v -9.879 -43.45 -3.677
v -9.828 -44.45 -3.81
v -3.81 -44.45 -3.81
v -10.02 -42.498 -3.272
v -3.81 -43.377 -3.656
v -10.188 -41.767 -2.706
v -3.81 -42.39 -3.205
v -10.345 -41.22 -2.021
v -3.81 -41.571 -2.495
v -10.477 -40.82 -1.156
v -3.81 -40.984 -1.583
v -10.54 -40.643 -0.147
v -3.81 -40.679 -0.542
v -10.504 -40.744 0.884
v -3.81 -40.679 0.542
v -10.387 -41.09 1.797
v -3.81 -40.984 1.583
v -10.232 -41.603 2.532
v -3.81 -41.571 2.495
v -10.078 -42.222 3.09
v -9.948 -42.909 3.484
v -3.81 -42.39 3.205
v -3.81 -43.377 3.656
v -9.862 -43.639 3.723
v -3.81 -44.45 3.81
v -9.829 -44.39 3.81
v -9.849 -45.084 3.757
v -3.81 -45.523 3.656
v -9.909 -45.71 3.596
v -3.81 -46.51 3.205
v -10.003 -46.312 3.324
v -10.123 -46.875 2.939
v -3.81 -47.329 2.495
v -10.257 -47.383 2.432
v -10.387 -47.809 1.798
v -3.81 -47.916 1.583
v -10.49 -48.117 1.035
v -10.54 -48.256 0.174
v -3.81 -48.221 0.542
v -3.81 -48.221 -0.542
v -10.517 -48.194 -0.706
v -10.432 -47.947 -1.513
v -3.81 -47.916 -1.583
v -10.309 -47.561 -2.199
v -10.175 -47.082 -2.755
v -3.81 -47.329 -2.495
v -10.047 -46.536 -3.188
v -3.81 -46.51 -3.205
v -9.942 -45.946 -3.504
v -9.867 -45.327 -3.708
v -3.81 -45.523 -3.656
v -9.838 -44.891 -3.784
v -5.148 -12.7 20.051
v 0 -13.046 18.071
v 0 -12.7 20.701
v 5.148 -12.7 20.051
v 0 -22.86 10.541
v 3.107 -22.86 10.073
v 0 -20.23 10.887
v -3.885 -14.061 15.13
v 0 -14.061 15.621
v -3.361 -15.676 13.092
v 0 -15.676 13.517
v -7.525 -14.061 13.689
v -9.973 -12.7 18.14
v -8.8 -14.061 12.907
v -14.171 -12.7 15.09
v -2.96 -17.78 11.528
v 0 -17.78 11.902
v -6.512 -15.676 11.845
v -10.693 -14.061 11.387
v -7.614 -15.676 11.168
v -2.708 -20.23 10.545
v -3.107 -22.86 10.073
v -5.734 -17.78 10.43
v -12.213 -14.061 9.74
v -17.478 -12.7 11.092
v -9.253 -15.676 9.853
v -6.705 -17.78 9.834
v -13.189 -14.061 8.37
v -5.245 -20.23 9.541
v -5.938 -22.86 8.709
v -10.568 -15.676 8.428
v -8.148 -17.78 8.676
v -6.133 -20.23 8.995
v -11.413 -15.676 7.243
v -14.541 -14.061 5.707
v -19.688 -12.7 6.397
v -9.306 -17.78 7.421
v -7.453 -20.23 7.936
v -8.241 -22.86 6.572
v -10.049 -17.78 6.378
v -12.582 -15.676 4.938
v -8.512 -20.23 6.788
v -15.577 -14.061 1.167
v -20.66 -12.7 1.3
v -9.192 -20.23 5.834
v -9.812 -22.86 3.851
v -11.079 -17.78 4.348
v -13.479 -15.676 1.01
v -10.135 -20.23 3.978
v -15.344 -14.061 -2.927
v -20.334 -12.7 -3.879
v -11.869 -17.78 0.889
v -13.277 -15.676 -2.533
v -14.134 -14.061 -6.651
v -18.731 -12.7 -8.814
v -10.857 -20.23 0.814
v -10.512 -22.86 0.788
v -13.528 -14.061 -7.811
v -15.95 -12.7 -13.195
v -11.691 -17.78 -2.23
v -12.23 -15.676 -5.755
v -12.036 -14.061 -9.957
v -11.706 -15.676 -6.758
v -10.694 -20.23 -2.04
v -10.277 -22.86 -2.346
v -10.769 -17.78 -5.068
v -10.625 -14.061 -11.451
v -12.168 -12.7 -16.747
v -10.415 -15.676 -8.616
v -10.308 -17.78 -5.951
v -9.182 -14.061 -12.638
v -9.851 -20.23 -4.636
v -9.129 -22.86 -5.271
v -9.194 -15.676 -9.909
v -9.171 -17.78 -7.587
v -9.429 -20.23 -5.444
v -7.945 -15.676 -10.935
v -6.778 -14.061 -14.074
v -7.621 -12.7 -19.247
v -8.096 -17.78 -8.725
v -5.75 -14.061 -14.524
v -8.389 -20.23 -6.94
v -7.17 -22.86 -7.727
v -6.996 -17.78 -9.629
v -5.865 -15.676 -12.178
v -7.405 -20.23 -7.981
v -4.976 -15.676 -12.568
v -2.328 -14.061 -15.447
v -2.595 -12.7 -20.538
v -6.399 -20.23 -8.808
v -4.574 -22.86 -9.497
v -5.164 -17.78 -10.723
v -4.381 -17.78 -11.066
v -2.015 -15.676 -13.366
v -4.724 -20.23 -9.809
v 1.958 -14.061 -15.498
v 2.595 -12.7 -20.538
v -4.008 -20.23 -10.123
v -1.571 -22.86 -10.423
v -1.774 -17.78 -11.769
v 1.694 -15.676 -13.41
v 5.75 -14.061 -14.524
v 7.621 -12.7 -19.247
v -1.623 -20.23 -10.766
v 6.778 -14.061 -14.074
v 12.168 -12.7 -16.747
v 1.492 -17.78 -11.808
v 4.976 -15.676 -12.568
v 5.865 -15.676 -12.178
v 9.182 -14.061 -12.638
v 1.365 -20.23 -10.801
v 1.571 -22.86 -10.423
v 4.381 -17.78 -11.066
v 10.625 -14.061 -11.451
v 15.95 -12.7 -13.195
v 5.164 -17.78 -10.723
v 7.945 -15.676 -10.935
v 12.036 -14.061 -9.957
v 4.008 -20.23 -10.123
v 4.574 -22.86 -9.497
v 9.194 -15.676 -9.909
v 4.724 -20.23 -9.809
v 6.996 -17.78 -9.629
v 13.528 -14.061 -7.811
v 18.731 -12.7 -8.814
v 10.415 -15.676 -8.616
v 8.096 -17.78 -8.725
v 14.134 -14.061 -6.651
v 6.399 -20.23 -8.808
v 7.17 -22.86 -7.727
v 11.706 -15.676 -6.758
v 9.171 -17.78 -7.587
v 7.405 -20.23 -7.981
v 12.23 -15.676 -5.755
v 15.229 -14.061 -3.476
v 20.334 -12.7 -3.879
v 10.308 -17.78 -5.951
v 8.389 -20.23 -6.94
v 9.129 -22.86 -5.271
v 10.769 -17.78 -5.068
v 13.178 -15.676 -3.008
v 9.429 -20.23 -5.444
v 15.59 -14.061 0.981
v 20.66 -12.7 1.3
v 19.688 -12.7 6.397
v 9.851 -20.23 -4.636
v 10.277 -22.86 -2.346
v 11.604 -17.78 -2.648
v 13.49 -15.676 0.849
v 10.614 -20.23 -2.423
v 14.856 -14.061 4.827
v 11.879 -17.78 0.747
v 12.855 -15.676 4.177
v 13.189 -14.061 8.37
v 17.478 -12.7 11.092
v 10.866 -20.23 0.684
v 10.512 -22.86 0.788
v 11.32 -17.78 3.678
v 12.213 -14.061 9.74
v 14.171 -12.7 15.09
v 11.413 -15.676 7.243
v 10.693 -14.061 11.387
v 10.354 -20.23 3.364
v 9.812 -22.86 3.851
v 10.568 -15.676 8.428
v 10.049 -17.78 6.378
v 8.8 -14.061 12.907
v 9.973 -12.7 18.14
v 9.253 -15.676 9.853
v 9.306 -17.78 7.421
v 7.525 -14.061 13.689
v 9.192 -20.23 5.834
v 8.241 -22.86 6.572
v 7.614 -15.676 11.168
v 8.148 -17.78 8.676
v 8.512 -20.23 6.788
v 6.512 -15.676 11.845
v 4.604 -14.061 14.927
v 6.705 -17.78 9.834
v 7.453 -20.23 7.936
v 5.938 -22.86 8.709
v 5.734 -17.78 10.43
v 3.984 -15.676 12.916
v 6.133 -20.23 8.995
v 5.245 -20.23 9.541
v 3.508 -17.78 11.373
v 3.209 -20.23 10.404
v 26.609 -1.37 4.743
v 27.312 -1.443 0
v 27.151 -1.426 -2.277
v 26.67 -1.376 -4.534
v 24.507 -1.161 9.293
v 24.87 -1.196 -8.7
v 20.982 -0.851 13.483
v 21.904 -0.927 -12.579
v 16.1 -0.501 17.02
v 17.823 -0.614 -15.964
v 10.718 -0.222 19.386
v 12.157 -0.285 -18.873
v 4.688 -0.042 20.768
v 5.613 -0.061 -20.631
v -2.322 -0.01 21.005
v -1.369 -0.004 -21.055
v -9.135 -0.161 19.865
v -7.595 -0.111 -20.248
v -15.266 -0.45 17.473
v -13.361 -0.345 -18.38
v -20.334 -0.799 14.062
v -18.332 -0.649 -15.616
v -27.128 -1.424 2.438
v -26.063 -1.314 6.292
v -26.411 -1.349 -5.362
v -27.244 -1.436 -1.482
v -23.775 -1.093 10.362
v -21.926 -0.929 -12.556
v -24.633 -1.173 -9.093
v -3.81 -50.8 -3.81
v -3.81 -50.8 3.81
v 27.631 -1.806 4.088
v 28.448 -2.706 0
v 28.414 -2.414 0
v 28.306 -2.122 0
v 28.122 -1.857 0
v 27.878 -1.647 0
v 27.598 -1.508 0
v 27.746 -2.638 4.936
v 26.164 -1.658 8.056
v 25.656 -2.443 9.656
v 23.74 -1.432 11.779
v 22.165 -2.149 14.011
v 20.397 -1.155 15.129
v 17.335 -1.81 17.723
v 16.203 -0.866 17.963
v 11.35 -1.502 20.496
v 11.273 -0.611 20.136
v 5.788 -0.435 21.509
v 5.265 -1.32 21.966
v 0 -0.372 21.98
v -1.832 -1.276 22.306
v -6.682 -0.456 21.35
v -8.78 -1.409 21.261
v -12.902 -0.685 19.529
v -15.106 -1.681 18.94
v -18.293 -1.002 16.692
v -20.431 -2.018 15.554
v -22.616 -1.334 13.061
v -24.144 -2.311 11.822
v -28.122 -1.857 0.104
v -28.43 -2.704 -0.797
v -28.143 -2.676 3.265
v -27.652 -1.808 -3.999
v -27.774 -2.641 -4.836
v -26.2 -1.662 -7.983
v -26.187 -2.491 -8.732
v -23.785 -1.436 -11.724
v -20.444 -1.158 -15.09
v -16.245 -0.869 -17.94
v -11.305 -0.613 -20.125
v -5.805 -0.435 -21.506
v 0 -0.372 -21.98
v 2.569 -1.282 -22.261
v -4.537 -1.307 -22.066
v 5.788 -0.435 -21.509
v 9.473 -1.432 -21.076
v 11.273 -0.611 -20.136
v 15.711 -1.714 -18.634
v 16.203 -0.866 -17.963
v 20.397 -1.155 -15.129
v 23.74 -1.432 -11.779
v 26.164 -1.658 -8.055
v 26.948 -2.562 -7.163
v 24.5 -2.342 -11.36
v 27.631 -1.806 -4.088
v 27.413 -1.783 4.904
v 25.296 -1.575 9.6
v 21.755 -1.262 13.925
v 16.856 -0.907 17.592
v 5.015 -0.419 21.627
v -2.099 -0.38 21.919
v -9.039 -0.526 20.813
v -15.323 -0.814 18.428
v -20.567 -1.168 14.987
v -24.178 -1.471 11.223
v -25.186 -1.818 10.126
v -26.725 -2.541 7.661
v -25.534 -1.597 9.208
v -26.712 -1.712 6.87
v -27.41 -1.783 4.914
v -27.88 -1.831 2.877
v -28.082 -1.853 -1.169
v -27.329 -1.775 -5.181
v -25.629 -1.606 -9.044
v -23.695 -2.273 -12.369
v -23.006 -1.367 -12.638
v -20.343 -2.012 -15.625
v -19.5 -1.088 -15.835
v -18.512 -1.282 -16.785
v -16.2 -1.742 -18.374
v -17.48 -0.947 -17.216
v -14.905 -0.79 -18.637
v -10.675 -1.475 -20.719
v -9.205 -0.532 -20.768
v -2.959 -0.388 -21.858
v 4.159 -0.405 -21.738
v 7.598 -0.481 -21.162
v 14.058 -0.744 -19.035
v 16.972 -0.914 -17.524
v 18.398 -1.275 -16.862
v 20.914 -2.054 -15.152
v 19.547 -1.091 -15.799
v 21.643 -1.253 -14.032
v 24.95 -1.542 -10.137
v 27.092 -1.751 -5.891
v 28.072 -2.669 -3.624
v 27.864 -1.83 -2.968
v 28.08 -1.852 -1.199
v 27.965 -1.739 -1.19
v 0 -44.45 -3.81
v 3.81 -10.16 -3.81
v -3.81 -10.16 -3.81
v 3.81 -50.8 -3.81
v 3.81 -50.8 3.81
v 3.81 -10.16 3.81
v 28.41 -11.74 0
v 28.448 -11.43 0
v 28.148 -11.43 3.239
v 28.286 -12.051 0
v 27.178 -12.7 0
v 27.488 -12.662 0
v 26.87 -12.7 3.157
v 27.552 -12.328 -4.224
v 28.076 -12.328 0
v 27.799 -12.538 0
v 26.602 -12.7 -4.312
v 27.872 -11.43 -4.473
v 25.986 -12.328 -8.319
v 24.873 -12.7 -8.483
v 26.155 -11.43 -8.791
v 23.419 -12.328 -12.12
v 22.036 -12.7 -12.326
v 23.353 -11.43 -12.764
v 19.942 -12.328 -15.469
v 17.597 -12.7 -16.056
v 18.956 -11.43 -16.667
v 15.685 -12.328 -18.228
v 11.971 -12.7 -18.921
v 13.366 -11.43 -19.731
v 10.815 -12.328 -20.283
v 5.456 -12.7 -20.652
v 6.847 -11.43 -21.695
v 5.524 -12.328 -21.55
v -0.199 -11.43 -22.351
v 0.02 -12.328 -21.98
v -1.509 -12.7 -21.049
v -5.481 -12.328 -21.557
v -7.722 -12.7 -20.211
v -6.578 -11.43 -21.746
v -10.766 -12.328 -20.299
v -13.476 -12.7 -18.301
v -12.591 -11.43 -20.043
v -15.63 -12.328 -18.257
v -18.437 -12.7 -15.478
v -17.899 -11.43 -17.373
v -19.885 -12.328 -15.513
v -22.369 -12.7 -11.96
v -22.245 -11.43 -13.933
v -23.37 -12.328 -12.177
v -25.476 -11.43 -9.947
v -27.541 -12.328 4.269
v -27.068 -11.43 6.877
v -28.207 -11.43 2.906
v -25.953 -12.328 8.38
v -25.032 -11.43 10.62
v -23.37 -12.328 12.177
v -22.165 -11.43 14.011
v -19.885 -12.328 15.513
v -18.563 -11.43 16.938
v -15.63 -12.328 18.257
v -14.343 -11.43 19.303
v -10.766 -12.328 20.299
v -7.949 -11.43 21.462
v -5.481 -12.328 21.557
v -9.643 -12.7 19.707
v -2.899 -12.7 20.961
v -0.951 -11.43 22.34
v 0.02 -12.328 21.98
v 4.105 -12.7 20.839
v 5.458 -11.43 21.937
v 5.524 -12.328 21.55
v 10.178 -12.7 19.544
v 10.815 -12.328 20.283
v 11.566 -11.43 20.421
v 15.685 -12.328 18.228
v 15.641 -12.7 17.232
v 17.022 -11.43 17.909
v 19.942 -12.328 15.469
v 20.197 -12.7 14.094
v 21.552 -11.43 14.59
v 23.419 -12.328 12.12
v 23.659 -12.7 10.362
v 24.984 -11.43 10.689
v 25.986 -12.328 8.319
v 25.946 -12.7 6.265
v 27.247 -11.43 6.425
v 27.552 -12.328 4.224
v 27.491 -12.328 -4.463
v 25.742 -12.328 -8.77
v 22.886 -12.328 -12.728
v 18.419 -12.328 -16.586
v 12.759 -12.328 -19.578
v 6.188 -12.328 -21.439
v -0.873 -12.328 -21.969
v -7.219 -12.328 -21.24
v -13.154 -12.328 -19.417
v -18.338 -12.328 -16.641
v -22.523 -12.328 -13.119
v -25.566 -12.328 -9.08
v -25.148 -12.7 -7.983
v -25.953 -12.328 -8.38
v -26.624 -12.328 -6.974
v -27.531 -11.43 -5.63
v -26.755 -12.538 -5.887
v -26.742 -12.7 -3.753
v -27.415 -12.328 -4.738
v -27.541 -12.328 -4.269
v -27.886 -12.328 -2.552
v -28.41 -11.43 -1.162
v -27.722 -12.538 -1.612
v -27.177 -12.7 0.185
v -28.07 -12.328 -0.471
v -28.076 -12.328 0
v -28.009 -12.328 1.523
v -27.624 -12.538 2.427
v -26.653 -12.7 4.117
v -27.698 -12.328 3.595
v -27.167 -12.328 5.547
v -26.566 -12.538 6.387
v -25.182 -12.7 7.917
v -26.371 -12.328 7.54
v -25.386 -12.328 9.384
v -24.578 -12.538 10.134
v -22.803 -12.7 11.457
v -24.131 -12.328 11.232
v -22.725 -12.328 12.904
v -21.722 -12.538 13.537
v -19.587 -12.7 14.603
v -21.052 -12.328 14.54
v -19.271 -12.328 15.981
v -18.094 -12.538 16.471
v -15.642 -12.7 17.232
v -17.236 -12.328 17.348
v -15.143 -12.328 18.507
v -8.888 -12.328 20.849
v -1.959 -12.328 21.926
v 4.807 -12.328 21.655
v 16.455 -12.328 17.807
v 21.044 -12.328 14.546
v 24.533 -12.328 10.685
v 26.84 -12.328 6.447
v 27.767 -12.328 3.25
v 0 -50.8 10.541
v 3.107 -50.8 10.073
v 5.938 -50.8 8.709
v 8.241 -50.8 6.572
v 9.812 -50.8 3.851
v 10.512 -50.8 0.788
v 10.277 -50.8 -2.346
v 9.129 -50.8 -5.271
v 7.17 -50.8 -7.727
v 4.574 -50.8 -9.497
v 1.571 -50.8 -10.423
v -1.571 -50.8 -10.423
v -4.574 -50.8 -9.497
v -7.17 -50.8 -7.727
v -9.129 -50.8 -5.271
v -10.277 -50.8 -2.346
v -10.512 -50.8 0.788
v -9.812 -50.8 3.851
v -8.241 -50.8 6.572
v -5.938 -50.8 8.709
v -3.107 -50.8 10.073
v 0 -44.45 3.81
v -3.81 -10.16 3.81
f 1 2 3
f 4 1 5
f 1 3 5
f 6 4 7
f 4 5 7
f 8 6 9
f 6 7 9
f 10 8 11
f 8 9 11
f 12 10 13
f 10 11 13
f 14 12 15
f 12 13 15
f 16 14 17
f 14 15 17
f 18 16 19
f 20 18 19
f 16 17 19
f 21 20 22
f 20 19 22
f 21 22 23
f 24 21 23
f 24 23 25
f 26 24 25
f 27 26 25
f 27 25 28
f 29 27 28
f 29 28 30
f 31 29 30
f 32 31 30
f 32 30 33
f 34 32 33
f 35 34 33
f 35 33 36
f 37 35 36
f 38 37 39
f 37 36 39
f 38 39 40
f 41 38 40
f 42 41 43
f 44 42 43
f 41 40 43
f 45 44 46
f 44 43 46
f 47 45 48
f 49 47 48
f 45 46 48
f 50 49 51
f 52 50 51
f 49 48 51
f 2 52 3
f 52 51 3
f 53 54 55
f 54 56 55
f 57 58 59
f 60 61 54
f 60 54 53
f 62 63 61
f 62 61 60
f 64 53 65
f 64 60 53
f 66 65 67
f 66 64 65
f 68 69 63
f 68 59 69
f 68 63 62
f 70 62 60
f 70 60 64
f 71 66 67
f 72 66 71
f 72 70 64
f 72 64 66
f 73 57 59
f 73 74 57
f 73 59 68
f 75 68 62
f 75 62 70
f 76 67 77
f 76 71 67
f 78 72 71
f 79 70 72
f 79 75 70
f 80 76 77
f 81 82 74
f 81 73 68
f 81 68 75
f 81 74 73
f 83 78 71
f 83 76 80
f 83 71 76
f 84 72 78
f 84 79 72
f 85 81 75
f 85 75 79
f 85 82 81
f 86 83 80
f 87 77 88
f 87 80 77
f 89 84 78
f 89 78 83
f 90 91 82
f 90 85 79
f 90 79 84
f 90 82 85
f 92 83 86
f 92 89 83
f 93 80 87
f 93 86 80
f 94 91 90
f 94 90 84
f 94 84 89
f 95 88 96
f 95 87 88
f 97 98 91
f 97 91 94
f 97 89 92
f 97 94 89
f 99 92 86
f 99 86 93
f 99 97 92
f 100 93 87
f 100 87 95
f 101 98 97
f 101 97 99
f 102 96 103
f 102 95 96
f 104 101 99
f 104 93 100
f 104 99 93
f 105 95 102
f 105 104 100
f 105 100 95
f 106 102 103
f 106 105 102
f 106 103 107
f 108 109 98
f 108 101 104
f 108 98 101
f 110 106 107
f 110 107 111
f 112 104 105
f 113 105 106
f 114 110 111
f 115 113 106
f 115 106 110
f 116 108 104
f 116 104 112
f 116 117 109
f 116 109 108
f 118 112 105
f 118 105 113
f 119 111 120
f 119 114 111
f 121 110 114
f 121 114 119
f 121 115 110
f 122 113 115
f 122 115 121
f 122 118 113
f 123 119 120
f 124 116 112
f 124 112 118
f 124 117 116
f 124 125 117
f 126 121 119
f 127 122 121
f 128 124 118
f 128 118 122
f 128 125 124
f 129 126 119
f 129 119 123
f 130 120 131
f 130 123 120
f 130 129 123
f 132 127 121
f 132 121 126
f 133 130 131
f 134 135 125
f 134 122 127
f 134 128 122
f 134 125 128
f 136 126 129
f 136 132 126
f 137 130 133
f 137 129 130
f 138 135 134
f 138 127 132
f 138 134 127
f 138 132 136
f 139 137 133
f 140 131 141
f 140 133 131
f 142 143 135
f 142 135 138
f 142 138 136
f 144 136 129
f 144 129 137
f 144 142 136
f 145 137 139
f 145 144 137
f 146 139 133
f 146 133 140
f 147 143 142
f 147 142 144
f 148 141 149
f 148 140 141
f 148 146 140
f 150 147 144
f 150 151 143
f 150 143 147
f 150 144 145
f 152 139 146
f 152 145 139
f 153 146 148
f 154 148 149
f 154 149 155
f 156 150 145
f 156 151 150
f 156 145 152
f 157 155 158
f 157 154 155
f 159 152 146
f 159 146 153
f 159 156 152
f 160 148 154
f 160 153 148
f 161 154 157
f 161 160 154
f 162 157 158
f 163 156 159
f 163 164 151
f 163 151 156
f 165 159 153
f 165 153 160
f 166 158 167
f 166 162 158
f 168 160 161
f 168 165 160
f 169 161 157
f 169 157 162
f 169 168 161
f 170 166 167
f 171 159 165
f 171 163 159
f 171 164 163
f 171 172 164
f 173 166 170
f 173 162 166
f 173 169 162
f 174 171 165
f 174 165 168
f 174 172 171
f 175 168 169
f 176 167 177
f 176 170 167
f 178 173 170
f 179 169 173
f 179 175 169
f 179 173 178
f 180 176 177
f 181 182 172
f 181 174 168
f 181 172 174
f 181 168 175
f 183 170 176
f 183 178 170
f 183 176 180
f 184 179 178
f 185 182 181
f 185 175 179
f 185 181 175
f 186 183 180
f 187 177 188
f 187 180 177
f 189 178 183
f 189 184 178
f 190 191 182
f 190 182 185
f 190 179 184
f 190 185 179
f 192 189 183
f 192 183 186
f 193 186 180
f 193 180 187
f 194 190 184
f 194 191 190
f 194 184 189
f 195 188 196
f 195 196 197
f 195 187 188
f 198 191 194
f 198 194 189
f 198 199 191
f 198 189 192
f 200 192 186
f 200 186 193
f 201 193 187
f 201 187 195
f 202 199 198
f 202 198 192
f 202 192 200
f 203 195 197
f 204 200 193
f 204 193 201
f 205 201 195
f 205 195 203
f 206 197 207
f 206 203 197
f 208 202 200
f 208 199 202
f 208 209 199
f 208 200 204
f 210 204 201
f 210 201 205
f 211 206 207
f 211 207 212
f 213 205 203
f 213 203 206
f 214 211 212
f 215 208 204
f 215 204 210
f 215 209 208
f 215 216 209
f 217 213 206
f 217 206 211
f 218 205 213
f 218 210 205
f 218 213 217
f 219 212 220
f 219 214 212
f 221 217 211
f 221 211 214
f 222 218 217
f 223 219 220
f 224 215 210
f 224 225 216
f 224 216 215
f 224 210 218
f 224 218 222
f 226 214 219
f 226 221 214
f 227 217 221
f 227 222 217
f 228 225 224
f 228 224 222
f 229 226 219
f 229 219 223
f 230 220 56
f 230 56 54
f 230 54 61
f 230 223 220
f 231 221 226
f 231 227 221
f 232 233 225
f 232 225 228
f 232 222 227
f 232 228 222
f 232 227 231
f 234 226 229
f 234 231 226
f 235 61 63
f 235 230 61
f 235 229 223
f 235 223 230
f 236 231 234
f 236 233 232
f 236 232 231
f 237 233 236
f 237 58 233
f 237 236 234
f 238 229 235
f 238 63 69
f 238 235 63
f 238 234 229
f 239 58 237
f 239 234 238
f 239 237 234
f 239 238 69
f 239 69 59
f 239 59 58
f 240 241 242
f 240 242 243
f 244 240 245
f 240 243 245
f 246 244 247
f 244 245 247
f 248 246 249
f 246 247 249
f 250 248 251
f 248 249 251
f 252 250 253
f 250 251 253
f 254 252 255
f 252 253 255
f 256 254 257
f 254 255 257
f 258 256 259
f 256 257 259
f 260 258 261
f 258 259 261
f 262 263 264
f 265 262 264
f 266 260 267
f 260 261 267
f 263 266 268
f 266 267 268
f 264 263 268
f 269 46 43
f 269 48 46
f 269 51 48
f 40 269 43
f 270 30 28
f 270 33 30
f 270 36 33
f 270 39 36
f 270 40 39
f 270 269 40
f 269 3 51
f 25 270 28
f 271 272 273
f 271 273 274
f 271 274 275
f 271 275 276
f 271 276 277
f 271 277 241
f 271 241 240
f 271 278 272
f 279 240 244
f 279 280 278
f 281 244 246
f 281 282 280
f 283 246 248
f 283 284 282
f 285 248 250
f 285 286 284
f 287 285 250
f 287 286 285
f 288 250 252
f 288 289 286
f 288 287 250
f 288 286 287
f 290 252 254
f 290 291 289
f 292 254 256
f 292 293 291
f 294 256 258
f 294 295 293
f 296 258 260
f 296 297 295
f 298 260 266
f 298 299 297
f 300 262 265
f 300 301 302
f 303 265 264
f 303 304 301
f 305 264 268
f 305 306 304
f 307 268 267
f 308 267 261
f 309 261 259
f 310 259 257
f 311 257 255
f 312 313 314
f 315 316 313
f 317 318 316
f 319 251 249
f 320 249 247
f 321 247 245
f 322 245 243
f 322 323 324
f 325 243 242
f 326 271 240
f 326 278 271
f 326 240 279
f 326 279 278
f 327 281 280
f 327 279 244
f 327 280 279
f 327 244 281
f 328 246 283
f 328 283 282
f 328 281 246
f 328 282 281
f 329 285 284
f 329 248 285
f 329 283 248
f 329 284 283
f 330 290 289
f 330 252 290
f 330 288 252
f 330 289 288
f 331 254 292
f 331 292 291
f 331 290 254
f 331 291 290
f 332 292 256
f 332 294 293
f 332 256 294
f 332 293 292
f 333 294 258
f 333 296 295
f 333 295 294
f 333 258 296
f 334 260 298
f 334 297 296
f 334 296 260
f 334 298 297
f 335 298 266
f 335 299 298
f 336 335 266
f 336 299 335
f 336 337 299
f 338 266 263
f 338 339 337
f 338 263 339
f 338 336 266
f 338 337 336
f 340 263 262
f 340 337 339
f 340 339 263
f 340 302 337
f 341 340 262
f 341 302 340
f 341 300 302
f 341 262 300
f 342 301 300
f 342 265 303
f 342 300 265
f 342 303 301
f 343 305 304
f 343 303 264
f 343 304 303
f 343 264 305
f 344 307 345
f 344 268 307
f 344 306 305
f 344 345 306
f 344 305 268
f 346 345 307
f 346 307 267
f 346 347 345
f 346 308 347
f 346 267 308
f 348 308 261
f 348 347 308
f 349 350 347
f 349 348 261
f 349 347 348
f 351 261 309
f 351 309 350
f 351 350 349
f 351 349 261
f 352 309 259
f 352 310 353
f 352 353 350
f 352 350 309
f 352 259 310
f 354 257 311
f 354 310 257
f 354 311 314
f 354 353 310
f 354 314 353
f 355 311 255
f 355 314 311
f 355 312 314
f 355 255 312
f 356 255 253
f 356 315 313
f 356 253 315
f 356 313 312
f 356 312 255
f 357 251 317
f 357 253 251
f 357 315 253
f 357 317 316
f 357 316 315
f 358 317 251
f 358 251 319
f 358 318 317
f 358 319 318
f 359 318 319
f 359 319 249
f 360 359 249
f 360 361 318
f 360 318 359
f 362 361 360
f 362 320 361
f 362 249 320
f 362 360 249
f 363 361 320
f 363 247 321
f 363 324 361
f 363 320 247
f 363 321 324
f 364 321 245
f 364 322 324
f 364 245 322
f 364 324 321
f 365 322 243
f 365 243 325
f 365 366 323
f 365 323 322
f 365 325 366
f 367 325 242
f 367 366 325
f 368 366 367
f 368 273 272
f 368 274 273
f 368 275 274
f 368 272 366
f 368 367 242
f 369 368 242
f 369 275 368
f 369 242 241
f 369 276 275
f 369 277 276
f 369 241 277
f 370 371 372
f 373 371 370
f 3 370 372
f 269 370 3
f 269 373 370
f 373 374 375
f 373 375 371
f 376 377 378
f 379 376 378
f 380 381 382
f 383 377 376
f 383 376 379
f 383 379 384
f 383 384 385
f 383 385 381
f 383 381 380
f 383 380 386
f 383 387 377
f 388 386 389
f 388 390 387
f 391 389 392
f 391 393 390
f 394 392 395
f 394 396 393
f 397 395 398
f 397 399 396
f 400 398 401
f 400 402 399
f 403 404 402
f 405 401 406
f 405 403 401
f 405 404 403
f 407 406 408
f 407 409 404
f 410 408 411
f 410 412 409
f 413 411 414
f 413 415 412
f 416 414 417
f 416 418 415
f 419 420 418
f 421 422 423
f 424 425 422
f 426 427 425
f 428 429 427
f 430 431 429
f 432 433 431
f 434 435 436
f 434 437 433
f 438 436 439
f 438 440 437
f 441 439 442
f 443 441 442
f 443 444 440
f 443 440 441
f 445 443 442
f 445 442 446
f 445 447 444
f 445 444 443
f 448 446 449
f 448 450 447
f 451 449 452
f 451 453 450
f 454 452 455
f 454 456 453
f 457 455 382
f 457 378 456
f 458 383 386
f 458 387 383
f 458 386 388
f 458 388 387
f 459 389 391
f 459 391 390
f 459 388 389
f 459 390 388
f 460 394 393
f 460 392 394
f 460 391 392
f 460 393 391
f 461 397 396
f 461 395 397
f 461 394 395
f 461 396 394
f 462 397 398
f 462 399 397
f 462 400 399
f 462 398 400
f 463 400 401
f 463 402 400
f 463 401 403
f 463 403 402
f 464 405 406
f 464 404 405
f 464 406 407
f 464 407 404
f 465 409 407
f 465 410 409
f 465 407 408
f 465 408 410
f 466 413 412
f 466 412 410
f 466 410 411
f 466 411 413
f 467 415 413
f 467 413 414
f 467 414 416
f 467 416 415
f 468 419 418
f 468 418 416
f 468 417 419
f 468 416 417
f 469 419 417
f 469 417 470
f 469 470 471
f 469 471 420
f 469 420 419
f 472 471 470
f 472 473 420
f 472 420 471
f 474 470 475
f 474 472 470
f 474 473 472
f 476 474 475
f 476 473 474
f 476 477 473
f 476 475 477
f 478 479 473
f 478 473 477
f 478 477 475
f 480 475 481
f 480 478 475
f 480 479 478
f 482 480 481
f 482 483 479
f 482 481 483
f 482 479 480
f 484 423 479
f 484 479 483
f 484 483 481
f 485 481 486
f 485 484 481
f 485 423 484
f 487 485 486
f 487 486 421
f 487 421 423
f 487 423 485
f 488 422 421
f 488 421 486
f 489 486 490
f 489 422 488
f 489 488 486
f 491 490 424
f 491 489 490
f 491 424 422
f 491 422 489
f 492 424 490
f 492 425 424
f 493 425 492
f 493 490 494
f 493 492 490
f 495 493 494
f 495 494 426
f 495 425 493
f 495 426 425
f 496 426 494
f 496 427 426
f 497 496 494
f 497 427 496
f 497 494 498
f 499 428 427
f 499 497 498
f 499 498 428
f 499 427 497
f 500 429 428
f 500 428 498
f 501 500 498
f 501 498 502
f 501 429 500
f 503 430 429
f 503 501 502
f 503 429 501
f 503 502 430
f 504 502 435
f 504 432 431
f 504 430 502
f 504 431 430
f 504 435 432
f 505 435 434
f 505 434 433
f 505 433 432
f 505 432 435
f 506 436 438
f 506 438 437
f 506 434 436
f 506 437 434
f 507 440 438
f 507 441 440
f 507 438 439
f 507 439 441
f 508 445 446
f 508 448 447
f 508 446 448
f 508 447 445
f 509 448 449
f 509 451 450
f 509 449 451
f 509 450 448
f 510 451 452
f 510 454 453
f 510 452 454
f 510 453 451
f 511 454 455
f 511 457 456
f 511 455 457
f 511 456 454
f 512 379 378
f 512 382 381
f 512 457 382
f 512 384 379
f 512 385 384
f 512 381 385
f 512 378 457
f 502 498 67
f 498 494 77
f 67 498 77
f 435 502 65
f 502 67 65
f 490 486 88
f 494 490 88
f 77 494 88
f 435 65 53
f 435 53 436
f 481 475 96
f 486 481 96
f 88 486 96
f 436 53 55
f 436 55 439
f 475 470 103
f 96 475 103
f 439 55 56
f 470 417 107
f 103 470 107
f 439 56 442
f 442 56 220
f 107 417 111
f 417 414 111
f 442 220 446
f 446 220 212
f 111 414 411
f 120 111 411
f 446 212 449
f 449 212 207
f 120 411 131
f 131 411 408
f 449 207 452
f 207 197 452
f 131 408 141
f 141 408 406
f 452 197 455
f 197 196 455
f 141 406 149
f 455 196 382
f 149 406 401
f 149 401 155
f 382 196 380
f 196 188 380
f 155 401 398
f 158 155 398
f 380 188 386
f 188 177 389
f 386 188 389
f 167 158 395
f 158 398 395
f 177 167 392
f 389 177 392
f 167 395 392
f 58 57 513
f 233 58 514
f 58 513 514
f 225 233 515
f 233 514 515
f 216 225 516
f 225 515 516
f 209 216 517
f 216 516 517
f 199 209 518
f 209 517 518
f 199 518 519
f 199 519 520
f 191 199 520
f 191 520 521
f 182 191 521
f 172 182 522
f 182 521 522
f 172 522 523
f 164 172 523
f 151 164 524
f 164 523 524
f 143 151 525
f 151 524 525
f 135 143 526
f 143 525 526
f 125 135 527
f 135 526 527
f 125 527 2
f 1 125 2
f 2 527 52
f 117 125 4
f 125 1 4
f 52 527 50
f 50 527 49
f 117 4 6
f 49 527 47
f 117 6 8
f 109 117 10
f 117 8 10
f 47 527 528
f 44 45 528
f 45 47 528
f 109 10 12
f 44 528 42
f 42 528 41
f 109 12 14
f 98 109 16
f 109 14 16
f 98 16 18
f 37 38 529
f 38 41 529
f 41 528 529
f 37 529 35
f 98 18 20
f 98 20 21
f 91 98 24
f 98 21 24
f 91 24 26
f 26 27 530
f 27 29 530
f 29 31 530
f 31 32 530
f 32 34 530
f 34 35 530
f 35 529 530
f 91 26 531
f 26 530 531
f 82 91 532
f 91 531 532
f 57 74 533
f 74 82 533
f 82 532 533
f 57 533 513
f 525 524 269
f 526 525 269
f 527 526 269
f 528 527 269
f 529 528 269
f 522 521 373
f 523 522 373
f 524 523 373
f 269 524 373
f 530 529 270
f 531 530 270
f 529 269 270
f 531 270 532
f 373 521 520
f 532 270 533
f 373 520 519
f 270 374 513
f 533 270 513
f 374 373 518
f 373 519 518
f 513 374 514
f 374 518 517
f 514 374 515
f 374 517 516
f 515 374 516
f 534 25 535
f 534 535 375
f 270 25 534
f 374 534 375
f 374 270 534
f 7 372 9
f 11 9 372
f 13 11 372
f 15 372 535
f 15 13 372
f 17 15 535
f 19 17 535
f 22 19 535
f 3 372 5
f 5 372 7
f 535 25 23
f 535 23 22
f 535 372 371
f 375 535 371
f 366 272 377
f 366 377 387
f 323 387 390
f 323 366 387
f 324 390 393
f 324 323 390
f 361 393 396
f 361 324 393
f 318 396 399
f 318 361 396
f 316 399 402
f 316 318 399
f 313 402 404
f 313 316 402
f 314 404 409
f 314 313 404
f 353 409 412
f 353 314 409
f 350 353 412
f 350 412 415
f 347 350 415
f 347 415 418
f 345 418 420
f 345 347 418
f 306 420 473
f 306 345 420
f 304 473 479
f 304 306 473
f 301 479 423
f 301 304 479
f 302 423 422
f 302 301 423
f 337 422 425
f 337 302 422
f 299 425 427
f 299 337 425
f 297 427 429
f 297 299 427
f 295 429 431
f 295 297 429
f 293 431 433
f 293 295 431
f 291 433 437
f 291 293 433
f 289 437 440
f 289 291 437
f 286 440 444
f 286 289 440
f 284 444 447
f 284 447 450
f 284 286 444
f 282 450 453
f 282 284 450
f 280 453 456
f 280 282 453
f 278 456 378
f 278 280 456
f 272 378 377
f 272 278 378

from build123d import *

# Parameters (mm, degrees)
SKETCH3_RX              = 28.448
SKETCH3_RY              = 22.352
BOSS_EXTRUDE1_DEPTH     = 12.7
CUT_EXTRUDE3_DEPTH      = 39.34306466624701
CUT_EXTRUDE3_DEPTH_BACK = 39.34306466624701
CUT_EXTRUDE4_DEPTH      = 39.343064831926725
CUT_EXTRUDE4_DEPTH_BACK = 39.343064831926725
SKETCH6_R               = 10.541000000000002
BOSS_EXTRUDE2_DEPTH     = 42.418
FILLET2_R               = 1.27
FILLET3_R               = 1.27
FILLET4_R               = 10.16
CUT_EXTRUDE7_DEPTH      = 40.64
SKETCH9_R               = 3.8099999999999996
CUT_EXTRUDE8_DEPTH      = 40.64


with BuildPart() as part:
    # Sketch3 → Boss-Extrude1 (new body)
    with BuildSketch(Plane(origin=(0, 0, 0), x_dir=(1, 0, 0), z_dir=(0, 1, 0))):
        with Locations(Location((0, 0), (0, 0, -9.31e-15))):
            Ellipse(SKETCH3_RX, SKETCH3_RY)
    extrude(amount=-BOSS_EXTRUDE1_DEPTH)

    # Sketch4 → Cut-Extrude3 (cut, two sides: drawn at the far end of the back side and taken through both)
    with BuildSketch(Plane.XY.offset(-CUT_EXTRUDE3_DEPTH_BACK)):
        with BuildLine():
            Line((-57.016183867065614, -6.350000000000001), (-57.016183867065614, 0))
            Line((-57.016183867065614, 0), (0, 0))
            ThreePointArc((0, 0), (-28.684349926236084, -1.5923924220459753), (-57.016183867065614, -6.350000000000001))
        make_face()
    extrude(amount=CUT_EXTRUDE3_DEPTH + CUT_EXTRUDE3_DEPTH_BACK, mode=Mode.SUBTRACT)

    # Sketch5 → Cut-Extrude4 (cut, two sides: drawn at the far end of the back side and taken through both)
    with BuildSketch(Plane.XY.offset(-CUT_EXTRUDE4_DEPTH_BACK)):
        with BuildLine():
            Line((57.016183867065614, -6.350000000000001), (57.016183867065614, 1.388e-14))
            Line((57.016183867065614, 1.388e-14), (0, 0))
            ThreePointArc((0, 0), (28.684349926236013, -1.5923924220459753), (57.016183867065614, -6.350000000000001))
        make_face()
    extrude(amount=CUT_EXTRUDE4_DEPTH + CUT_EXTRUDE4_DEPTH_BACK, mode=Mode.SUBTRACT)

    # Sketch6 → Boss-Extrude2 (add)
    with BuildSketch(Plane(origin=(0, -50.8, 0), x_dir=(1, 0, 0), z_dir=(0, 1, 0))):
        with Locations(Location((0, 0, 0), (0, 0, 270))):
            Circle(SKETCH6_R)
    extrude(amount=BOSS_EXTRUDE2_DEPTH)

    # Fillet2
    fillet2_edges = [part.edges().sort_by_distance(p)[0] for p in [
        (18.897313786773612, -0.6899257500063387, 16.707844987556147),
    ]]
    fillet(fillet2_edges, radius=FILLET2_R)

    # Fillet3
    fillet3_edges = [part.edges().sort_by_distance(p)[0] for p in [
        (-28.44799943216588, -12.7, 0.00446597468168338),
    ]]
    fillet(fillet3_edges, radius=FILLET3_R)

    # Fillet4
    fillet4_edges = [part.edges().sort_by_distance(p)[0] for p in [
        (5.33e-15, -12.700000000000003, -10.541000000000002),
    ]]
    fillet(fillet4_edges, radius=FILLET4_R)

    # Sketch8 → Cut-Extrude7 (cut)
    with BuildSketch(Plane(origin=(0, -50.8, 0), x_dir=(1, 0, 0), z_dir=(0, 1, 0))):
        Polygon((3.8099999999999996, 3.8099999999999996), (-3.8100000000000014, 3.8099999999999996), (-3.8099999999999996, -3.8100000000000005), (3.81, -3.8100000000000005), align=None)
    extrude(amount=CUT_EXTRUDE7_DEPTH, mode=Mode.SUBTRACT)

    # Sketch9 → Cut-Extrude8 (cut)
    with BuildSketch(Plane(origin=(0, 0, 0), x_dir=(0, 0, -1), z_dir=(1, 0, 0))):
        with Locations((5.44e-15, -44.449999999999996)):
            Circle(SKETCH9_R)
    extrude(amount=-CUT_EXTRUDE8_DEPTH, mode=Mode.SUBTRACT)


solid = part.part
